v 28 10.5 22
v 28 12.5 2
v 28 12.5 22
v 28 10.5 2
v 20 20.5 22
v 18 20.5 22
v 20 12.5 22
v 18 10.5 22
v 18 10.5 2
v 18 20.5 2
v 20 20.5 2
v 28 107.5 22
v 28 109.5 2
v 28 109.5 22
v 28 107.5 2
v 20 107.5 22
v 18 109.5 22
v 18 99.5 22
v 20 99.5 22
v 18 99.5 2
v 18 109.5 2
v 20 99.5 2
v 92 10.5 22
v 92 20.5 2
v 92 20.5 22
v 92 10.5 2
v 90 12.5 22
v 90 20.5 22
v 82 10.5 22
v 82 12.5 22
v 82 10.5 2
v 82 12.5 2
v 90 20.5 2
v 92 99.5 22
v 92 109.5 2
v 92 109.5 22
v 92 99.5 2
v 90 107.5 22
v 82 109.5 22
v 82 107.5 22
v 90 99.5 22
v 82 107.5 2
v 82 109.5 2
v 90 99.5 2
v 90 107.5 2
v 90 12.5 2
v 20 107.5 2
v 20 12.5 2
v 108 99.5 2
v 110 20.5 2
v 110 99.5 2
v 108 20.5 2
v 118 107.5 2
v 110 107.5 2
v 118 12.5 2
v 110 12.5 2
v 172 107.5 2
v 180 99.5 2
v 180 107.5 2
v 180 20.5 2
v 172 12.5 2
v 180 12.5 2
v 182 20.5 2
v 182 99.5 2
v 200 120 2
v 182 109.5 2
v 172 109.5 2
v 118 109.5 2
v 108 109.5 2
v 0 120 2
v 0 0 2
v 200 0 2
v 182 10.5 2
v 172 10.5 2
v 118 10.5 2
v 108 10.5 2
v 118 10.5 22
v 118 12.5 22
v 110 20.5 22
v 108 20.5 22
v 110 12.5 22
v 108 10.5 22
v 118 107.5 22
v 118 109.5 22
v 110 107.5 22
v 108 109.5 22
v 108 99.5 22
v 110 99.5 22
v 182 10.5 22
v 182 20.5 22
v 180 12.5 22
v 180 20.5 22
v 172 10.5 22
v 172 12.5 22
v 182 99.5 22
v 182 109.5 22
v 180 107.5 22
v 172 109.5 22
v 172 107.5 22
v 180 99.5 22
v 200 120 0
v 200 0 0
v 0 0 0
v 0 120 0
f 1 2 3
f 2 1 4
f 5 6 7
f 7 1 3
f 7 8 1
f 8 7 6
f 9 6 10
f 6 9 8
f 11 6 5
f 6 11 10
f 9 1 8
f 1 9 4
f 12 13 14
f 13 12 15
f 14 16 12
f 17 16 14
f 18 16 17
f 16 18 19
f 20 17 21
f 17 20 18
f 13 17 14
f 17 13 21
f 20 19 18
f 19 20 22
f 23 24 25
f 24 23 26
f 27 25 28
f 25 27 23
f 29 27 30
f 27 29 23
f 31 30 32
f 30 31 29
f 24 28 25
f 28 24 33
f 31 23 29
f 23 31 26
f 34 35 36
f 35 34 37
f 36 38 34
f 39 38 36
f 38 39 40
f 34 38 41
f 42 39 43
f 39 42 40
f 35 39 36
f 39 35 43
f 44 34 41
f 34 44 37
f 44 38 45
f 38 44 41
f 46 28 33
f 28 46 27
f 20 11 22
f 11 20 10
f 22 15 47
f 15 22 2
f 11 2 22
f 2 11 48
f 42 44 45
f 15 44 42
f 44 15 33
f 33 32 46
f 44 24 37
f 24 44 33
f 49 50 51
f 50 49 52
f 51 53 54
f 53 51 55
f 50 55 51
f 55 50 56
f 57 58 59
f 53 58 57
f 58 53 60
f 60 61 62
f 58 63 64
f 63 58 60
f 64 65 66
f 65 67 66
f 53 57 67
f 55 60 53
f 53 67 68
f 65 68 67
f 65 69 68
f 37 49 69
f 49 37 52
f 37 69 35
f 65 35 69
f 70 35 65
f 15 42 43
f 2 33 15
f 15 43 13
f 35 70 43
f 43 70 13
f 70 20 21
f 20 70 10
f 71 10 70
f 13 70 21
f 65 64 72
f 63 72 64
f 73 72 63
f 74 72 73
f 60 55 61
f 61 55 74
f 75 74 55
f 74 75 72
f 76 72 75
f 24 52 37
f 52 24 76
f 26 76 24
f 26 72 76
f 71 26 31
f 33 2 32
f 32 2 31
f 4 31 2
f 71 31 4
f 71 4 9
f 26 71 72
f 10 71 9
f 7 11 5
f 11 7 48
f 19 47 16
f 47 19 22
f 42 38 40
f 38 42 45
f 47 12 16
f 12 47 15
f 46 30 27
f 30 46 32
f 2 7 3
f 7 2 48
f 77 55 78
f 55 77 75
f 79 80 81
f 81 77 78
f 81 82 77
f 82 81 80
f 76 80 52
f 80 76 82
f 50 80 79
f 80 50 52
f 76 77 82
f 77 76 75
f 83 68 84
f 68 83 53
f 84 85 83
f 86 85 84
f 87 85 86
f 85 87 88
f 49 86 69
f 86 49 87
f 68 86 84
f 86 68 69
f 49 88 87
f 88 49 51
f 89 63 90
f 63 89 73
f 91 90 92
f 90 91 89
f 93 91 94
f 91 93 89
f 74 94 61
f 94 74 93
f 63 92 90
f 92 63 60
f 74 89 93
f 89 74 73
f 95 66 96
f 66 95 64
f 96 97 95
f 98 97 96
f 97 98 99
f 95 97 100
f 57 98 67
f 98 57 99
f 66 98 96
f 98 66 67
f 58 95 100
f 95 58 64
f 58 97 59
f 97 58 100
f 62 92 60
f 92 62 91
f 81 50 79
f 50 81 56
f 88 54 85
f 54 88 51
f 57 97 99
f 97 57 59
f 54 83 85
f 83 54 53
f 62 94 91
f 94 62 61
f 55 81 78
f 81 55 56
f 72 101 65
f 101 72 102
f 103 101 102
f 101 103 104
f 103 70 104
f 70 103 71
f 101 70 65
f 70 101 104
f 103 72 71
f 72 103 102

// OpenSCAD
//
//
//

$l = 200;
$w = 120;
$t =   2;

$rpi_w = 70;
$rpi_l = 95;

$holder_l = 10;
$holder_w = 10;
$holder_h = 20;

module Holder() {
    difference() {
        union() {
            translate( [ -$t, -$t, -1 ] ) {
                cube( [ $holder_w, $holder_l, $holder_h+1 ]);
            }
            translate( [ -$t, $rpi_l - $holder_l + $t, -1 ] ) {
                cube( [ $holder_w, $holder_l, $holder_h+1 ]);
            }
            translate( [ $rpi_w - $holder_w + $t, -$t, -1 ] ) {
                cube( [ $holder_w, $holder_l, $holder_h+1 ]);
            }
            translate( [ $rpi_w - $holder_w + $t, $rpi_l - $holder_l + $t, -1 ] ) {
                cube( [ $holder_w, $holder_l, $holder_h+1 ]);
            }
        };
        cube( [ $rpi_w, $rpi_l, $holder_h+1 ]);
    }
}

union() {
    cube( [ $l, $w, $t ]);

    translate( [ ( $l - 2*$rpi_w ) / 3, ( $w - $rpi_l ) / 2, $t ] ) {
        Holder();
    };

    translate( [ 2 * ( $l - 2*$rpi_w ) / 3 + $rpi_w, ( $w - $rpi_l ) / 2, $t ] ) {
        Holder();
    };
}
